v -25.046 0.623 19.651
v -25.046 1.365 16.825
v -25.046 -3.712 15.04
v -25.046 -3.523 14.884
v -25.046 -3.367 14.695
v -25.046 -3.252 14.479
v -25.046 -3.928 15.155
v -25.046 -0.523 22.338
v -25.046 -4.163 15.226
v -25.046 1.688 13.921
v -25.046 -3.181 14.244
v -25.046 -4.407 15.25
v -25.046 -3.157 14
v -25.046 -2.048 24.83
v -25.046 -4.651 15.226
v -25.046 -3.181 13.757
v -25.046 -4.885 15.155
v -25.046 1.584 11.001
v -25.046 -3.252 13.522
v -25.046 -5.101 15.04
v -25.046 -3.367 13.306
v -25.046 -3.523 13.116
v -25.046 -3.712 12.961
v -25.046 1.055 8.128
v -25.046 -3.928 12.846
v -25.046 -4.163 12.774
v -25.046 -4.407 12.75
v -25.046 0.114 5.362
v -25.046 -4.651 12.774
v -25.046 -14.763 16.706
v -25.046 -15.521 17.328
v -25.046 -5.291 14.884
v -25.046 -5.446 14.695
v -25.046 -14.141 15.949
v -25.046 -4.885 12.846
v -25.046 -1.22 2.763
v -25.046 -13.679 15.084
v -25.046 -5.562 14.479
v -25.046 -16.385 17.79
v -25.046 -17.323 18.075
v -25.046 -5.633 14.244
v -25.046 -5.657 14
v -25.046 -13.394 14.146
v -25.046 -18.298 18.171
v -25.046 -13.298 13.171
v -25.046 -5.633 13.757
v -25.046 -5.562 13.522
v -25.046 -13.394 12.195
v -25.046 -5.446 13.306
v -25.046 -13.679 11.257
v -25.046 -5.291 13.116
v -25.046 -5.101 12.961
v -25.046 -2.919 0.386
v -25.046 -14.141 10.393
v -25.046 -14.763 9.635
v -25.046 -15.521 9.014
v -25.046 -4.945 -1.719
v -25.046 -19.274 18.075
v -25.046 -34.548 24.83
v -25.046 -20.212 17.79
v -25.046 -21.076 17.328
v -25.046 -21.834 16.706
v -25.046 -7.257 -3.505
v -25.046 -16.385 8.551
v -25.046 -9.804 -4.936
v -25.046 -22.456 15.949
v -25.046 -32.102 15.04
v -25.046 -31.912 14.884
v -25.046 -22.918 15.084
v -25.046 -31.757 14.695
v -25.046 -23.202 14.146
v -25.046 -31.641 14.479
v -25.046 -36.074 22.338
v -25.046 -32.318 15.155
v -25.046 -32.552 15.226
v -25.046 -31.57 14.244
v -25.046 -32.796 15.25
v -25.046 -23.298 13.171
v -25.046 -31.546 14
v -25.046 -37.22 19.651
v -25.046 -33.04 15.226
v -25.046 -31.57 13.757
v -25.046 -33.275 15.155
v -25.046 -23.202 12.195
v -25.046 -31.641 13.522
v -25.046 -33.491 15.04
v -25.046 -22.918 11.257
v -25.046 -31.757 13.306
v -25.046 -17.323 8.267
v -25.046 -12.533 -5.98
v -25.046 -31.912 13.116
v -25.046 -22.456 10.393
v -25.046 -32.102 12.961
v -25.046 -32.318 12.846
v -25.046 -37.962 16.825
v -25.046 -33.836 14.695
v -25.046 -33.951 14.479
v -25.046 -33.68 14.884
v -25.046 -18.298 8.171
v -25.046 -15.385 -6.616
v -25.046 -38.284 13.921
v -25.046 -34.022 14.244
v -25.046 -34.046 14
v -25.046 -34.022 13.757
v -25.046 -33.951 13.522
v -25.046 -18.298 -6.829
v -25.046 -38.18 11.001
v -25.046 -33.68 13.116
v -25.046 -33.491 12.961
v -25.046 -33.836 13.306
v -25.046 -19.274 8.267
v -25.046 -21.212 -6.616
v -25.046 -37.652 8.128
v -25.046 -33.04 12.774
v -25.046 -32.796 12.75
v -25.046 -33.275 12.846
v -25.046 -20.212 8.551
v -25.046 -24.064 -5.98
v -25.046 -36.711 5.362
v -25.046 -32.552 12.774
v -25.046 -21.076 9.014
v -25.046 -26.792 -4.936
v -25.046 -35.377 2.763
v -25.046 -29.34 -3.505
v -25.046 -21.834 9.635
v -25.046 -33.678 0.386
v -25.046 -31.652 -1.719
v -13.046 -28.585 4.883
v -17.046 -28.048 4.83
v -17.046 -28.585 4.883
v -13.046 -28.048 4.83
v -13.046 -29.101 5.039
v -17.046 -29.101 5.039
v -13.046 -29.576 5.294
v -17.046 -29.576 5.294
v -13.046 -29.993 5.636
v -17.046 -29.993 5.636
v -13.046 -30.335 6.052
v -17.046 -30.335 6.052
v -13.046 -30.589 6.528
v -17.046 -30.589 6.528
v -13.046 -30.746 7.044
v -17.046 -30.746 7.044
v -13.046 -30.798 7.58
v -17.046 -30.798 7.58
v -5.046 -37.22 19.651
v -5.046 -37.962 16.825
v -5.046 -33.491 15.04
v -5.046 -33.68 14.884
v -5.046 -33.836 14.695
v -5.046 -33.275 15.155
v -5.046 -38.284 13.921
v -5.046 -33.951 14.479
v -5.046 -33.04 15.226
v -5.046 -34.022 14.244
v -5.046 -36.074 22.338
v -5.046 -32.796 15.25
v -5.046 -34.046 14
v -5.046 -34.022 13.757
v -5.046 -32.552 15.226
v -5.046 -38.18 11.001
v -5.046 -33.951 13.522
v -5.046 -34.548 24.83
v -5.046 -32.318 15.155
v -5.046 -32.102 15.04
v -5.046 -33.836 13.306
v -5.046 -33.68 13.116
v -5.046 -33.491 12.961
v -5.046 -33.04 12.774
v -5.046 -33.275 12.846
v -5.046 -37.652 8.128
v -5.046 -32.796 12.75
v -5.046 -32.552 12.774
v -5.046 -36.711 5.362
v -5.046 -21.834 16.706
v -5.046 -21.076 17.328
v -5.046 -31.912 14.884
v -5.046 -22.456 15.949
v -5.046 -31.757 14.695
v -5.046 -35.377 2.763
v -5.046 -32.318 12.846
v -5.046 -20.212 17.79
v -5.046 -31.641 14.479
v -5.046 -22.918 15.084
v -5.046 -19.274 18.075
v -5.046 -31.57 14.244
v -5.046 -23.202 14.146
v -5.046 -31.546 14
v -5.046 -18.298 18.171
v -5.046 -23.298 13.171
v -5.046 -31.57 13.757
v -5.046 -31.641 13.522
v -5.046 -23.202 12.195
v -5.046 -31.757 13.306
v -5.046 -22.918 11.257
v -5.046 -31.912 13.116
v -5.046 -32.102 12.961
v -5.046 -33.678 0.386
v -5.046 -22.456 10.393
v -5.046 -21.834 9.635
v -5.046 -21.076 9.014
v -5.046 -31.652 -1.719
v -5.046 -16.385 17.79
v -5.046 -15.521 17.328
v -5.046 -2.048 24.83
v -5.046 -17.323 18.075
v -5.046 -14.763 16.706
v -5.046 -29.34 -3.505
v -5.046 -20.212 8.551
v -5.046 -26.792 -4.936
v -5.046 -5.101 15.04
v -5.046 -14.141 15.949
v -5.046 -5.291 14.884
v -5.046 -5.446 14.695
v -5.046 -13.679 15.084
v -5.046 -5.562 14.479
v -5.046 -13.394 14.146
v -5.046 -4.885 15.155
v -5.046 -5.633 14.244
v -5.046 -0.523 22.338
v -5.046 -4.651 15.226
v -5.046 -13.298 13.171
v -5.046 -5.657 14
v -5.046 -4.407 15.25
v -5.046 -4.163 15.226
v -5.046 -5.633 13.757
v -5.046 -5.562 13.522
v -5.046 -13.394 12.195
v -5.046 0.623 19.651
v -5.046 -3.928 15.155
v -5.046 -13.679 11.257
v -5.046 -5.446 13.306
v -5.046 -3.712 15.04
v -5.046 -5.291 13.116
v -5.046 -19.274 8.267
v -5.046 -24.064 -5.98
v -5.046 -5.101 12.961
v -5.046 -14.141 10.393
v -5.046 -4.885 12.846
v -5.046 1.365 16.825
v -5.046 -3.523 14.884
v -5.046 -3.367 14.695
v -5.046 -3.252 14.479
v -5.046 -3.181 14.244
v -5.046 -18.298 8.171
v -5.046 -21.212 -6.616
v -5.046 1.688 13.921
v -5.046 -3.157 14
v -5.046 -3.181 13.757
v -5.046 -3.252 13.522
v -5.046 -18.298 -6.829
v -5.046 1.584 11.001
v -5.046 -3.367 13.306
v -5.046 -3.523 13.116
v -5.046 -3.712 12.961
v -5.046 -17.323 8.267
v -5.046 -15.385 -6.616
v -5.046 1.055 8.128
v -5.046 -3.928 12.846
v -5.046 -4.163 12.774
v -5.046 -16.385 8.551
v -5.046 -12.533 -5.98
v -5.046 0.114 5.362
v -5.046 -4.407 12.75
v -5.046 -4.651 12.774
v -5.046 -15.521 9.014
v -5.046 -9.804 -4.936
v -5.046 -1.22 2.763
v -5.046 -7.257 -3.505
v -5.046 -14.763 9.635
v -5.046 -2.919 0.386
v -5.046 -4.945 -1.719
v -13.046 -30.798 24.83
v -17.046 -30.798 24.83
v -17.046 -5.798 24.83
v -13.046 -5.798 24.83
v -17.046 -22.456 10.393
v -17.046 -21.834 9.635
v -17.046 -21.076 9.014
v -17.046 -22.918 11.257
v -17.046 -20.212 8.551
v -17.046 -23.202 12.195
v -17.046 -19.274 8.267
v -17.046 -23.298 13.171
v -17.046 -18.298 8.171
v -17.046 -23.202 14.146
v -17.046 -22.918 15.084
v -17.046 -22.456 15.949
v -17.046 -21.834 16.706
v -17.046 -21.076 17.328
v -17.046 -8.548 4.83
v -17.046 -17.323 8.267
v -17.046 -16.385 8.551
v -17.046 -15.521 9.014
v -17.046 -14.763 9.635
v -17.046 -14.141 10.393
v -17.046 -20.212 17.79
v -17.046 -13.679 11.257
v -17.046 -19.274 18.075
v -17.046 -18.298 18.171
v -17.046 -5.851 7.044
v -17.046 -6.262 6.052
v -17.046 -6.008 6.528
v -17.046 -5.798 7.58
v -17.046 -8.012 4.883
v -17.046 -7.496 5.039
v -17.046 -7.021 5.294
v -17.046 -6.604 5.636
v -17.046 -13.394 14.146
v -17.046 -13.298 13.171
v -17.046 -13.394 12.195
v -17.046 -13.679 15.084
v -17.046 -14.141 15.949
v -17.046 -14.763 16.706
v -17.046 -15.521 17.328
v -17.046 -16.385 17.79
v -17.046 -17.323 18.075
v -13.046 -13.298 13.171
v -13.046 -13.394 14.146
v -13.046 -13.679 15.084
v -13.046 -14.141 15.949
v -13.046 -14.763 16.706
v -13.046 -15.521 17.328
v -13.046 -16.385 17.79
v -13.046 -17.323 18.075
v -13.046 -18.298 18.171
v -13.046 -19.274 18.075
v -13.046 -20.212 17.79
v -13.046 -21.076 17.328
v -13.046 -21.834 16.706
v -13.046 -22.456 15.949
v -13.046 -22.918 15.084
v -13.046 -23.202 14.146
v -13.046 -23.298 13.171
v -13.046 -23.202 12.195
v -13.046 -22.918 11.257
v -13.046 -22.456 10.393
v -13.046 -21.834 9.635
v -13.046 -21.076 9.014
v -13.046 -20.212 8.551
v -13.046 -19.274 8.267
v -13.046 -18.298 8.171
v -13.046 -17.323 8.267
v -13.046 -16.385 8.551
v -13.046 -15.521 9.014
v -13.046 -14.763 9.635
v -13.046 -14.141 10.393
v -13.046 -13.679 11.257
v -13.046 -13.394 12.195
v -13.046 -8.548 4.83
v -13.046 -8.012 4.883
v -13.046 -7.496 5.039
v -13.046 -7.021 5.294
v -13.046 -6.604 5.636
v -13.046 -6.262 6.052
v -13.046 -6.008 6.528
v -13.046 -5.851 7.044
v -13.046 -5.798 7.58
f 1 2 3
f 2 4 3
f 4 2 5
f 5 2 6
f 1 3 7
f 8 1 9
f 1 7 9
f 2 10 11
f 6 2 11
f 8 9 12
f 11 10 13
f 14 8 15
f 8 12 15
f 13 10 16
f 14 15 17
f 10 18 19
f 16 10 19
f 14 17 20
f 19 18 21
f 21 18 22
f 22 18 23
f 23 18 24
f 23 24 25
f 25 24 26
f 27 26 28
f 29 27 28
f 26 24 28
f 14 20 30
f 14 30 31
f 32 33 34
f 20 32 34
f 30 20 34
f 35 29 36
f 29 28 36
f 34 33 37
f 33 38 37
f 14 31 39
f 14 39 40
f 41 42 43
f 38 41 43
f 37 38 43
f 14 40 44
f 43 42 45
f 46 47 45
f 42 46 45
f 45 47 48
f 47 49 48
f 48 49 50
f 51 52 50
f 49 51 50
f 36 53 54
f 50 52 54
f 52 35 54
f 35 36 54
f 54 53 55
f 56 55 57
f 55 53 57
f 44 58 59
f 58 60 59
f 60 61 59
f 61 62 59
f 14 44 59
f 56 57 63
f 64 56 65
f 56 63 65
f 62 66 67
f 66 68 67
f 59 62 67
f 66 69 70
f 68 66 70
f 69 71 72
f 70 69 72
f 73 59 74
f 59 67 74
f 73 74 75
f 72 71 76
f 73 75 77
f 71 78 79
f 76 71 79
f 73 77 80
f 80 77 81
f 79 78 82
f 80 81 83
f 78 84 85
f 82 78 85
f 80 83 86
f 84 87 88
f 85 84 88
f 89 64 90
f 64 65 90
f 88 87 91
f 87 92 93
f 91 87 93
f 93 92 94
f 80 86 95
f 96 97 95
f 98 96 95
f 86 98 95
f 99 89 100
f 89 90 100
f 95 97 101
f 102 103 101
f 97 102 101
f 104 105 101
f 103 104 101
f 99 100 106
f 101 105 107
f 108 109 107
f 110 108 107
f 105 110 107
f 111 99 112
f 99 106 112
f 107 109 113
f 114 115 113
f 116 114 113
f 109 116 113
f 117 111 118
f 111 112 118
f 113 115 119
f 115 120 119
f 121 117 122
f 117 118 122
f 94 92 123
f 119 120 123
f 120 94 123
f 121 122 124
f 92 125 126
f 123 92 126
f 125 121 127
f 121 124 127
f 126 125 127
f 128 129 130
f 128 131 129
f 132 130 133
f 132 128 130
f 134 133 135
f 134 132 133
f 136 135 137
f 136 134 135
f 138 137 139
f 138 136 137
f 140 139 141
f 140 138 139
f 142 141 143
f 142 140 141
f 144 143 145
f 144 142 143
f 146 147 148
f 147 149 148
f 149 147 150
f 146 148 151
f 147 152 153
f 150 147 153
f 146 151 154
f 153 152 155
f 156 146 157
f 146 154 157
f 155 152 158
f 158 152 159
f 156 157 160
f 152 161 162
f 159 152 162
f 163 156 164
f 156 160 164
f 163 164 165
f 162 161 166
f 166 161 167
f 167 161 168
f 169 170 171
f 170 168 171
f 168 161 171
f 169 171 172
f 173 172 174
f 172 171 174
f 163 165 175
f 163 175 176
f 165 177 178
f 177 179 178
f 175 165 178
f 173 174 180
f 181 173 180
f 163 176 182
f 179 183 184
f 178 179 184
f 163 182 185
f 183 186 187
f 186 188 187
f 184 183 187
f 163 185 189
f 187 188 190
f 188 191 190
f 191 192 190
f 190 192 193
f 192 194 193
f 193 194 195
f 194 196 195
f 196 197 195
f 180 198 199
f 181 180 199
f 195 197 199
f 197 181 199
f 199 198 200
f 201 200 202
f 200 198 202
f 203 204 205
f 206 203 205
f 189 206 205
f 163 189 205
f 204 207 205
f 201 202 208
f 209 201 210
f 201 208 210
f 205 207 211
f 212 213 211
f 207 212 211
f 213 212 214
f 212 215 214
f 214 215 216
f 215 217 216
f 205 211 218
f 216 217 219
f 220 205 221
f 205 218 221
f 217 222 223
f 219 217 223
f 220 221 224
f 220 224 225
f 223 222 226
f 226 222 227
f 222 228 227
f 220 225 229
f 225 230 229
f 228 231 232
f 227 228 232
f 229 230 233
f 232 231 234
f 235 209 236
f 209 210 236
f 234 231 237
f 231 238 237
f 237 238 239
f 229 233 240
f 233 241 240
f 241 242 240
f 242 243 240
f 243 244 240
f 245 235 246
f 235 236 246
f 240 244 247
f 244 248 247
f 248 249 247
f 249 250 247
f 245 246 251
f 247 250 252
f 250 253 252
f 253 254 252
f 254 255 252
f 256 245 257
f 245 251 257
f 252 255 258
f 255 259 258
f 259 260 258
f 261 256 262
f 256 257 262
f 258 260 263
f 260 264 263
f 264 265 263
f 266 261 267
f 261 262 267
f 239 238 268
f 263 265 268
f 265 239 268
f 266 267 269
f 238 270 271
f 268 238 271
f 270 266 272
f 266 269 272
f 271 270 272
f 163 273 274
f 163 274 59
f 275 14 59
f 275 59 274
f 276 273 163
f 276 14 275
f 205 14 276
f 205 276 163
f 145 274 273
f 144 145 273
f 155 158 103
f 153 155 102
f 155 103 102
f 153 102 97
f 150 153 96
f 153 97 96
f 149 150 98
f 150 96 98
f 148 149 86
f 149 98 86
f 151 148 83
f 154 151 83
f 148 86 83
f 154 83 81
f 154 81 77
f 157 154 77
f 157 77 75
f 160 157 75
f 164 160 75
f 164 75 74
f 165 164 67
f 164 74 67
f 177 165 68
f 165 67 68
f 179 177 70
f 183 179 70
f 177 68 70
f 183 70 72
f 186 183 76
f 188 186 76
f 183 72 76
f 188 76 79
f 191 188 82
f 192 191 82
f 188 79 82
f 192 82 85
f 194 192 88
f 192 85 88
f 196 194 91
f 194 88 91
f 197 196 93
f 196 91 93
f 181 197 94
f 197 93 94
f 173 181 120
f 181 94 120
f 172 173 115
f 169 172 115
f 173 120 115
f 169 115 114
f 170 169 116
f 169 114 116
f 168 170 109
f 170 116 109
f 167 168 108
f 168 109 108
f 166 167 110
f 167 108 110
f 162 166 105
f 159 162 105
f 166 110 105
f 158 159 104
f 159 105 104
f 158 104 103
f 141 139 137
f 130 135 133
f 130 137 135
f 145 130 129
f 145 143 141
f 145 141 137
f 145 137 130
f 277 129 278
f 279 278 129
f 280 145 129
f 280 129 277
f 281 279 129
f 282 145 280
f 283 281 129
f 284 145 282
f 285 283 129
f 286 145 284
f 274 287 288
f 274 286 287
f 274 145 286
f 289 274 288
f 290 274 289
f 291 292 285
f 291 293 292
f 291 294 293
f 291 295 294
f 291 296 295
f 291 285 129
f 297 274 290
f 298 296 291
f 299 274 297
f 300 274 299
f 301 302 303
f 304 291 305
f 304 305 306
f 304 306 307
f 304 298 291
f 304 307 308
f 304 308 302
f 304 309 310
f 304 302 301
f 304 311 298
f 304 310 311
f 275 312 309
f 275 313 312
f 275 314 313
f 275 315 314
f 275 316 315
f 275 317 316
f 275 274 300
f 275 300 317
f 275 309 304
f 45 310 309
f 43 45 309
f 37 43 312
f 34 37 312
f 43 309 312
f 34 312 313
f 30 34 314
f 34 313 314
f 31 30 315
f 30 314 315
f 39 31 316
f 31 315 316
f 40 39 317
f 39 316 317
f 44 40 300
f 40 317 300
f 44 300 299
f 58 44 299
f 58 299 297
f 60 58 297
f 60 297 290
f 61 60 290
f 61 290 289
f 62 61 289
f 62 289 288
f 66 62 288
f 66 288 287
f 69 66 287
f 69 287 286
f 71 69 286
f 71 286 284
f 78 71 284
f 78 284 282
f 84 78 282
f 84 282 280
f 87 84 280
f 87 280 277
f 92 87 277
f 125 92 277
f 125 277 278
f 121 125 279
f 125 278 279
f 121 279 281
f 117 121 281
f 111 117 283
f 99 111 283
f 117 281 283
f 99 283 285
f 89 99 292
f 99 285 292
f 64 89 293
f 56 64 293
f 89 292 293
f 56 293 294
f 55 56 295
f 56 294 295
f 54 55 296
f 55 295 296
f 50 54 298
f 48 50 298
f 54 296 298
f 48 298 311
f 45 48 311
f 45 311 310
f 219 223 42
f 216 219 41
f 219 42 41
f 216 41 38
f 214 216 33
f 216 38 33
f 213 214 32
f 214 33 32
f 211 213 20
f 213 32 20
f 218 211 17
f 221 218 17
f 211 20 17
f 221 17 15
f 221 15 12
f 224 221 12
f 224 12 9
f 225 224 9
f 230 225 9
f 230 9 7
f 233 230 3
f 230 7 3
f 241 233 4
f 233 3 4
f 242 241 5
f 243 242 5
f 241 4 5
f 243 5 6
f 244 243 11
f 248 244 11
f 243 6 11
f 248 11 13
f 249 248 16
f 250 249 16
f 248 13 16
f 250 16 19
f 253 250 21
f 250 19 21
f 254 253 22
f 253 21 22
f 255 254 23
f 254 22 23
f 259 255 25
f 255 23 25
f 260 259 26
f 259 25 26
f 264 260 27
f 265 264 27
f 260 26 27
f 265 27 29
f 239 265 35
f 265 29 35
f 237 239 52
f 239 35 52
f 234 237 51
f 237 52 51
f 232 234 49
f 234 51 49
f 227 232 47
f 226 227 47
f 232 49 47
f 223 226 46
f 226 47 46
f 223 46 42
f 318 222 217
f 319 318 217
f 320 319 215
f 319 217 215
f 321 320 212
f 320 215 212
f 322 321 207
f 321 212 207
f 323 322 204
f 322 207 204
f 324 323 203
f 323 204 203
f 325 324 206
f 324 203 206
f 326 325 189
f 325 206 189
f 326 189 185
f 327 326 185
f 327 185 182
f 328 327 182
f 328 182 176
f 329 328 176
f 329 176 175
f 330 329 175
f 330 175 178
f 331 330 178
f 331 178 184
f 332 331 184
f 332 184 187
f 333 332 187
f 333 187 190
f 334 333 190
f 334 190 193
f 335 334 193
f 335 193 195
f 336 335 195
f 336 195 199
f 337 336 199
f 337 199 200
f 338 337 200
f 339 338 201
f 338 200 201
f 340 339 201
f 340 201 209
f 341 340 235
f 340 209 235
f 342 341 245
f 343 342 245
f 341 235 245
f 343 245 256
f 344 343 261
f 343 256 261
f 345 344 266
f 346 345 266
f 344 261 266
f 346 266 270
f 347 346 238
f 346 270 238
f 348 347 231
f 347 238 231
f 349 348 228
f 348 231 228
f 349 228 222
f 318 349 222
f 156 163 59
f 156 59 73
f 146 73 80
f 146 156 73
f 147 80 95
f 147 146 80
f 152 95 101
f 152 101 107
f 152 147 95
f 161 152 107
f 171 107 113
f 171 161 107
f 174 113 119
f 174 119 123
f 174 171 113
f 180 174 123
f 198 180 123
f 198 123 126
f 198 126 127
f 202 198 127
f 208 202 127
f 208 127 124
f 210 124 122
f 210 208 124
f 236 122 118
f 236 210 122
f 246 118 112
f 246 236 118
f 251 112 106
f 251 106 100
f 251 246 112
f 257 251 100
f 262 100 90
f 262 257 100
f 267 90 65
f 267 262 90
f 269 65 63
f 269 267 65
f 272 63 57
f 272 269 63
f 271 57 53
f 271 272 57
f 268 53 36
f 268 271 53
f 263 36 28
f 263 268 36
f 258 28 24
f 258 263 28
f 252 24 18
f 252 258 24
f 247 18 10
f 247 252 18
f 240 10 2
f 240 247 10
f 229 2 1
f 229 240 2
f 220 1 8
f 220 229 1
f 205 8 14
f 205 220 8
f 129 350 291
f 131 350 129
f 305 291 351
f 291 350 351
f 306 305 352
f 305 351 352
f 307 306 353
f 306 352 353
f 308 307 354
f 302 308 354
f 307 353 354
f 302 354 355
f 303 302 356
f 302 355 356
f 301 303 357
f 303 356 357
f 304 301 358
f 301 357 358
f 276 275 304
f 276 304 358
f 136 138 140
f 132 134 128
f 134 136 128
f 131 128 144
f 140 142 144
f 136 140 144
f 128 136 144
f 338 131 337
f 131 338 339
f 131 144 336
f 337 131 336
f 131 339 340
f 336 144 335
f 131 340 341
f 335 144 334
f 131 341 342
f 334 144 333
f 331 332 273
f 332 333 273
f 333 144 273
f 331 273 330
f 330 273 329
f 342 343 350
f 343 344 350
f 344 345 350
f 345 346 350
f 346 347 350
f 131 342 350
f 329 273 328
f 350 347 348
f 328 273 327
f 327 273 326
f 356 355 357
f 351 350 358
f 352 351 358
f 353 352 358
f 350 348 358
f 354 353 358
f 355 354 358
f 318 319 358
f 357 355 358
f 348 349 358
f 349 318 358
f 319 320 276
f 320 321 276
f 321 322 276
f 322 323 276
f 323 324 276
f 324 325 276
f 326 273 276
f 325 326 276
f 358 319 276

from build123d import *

# Parameters (mm, degrees)
BOSS_EXTRU_1_START      = -10
BOSS_EXTRU_1_DEPTH      = 80
ESQUISSE3_W             = 16
ESQUISSE3_H             = 100
ENL_V_MAT_EXTRU_1_DEPTH = 80
BOSS_EXTRU_2_DEPTH      = 80
CONG_1_R                = 11
ENL_V_MAT_EXTRU_2_REACH = 146.791
ESQUISSE8_R             = 20
ESQUISSE9_R             = 5
ENL_V_MAT_EXTRU_3_DEPTH = 80
ECHELLE1_SCALE          = 0.25


with BuildPart() as part:
    # Esquisse2 → Boss.-Extru.1 (new body)
    with BuildSketch(Plane.XY.offset(BOSS_EXTRU_1_START)):
        Polygon((-55.04572219, 21.601620468), (-55.04572219, -49.548379532), (-55.04572219, -83.308379532), (24.95427781, -83.308379532), (24.95427781, -43.249651956), (24.95427781, 27.900348044), (24.95427781, 46.691620468), (-55.04572219, 46.691620468), align=None)
    extrude(amount=BOSS_EXTRU_1_DEPTH)

    # Esquisse3 → Enlèv. mat.-Extru.1 (cut)
    with BuildSketch(Plane.XY.offset(70)):
        with Locations((-15.04572219, -18.308379532)):
            Rectangle(ESQUISSE3_W, ESQUISSE3_H)
    extrude(amount=-ENL_V_MAT_EXTRU_1_DEPTH, mode=Mode.SUBTRACT)

    # Esquisse6 → Boss.-Extru.2 (add)
    with BuildSketch(Plane(origin=(24.95427781, 0, 0), x_dir=(0, 0, -1), z_dir=(1, 0, 0))):
        with BuildLine():
            Line((-70, 46.691620468), (10, 46.691620468))
            Line((10, 46.691620468), (10, -83.308379532))
            Line((10, -83.308379532), (-70, -83.308379532))
            ThreePointArc((-70, -83.308379532), (56.636895265, -18.308379532), (-70, 46.691620468))
        make_face()
    extrude(amount=-BOSS_EXTRU_2_DEPTH)

    # Congé1
    cong_1_edges = [part.edges().sort_by_distance(p)[0] for p in [
        (-15.04572219, 31.691620468, -10),
        (-15.04572219, -68.308379532, -10),
    ]]
    fillet(cong_1_edges, radius=CONG_1_R)

    # Enlèv. mat.-Extru.2: up to this face of the body (flat: up to its plane)
    enl_v_mat_extru_2_end = Plane(part.part.faces().sort_by_distance((-55.04572219, -18.308379532, 12.636185619))[0])
    # Esquisse8 → Enlèv. mat.-Extru.2 (cut, up to the picked face)
    with BuildSketch(Plane(origin=(24.95427781, 0, 0), x_dir=(0, 0, -1), z_dir=(1, 0, 0)), mode=Mode.PRIVATE) as enl_v_mat_extru_2_sk1:
        with Locations(Location((-23.363104735, -18.308379532, 0), (0, 0, 90))):
            Circle(ESQUISSE8_R)
    enl_v_mat_extru_2_tool1 = split(extrude(enl_v_mat_extru_2_sk1.sketch, amount=-ENL_V_MAT_EXTRU_2_REACH, mode=Mode.PRIVATE), bisect_by=enl_v_mat_extru_2_end, keep=Keep.BOTH, mode=Mode.PRIVATE)
    add(enl_v_mat_extru_2_tool1.solids().sort_by(Axis((24.954278, -18.30838, 23.363105), (-1, 0, 0)))[0], mode=Mode.SUBTRACT)

    # Esquisse9 → Enlèv. mat.-Extru.3 (cut)
    with BuildSketch(Plane.ZY.offset(55.04572219)):
        with Locations(Location((26.681094555, 37.25802852, 0), (0, 0, 270))):
            Circle(ESQUISSE9_R)
        with Locations(Location((26.681094555, -76.2999152, 0), (0, 0, 270))):
            Circle(ESQUISSE9_R)
    extrude(amount=-ENL_V_MAT_EXTRU_3_DEPTH, mode=Mode.SUBTRACT)


with BuildPart() as part_1:
    # Echelle1: scaled about (-15.04572219, -18.295074577, 9.77346256)
    add(part.part.scale(ECHELLE1_SCALE).moved(Location((-11.284291642, -13.721305933, 7.33009692))))


solid = part_1.part
